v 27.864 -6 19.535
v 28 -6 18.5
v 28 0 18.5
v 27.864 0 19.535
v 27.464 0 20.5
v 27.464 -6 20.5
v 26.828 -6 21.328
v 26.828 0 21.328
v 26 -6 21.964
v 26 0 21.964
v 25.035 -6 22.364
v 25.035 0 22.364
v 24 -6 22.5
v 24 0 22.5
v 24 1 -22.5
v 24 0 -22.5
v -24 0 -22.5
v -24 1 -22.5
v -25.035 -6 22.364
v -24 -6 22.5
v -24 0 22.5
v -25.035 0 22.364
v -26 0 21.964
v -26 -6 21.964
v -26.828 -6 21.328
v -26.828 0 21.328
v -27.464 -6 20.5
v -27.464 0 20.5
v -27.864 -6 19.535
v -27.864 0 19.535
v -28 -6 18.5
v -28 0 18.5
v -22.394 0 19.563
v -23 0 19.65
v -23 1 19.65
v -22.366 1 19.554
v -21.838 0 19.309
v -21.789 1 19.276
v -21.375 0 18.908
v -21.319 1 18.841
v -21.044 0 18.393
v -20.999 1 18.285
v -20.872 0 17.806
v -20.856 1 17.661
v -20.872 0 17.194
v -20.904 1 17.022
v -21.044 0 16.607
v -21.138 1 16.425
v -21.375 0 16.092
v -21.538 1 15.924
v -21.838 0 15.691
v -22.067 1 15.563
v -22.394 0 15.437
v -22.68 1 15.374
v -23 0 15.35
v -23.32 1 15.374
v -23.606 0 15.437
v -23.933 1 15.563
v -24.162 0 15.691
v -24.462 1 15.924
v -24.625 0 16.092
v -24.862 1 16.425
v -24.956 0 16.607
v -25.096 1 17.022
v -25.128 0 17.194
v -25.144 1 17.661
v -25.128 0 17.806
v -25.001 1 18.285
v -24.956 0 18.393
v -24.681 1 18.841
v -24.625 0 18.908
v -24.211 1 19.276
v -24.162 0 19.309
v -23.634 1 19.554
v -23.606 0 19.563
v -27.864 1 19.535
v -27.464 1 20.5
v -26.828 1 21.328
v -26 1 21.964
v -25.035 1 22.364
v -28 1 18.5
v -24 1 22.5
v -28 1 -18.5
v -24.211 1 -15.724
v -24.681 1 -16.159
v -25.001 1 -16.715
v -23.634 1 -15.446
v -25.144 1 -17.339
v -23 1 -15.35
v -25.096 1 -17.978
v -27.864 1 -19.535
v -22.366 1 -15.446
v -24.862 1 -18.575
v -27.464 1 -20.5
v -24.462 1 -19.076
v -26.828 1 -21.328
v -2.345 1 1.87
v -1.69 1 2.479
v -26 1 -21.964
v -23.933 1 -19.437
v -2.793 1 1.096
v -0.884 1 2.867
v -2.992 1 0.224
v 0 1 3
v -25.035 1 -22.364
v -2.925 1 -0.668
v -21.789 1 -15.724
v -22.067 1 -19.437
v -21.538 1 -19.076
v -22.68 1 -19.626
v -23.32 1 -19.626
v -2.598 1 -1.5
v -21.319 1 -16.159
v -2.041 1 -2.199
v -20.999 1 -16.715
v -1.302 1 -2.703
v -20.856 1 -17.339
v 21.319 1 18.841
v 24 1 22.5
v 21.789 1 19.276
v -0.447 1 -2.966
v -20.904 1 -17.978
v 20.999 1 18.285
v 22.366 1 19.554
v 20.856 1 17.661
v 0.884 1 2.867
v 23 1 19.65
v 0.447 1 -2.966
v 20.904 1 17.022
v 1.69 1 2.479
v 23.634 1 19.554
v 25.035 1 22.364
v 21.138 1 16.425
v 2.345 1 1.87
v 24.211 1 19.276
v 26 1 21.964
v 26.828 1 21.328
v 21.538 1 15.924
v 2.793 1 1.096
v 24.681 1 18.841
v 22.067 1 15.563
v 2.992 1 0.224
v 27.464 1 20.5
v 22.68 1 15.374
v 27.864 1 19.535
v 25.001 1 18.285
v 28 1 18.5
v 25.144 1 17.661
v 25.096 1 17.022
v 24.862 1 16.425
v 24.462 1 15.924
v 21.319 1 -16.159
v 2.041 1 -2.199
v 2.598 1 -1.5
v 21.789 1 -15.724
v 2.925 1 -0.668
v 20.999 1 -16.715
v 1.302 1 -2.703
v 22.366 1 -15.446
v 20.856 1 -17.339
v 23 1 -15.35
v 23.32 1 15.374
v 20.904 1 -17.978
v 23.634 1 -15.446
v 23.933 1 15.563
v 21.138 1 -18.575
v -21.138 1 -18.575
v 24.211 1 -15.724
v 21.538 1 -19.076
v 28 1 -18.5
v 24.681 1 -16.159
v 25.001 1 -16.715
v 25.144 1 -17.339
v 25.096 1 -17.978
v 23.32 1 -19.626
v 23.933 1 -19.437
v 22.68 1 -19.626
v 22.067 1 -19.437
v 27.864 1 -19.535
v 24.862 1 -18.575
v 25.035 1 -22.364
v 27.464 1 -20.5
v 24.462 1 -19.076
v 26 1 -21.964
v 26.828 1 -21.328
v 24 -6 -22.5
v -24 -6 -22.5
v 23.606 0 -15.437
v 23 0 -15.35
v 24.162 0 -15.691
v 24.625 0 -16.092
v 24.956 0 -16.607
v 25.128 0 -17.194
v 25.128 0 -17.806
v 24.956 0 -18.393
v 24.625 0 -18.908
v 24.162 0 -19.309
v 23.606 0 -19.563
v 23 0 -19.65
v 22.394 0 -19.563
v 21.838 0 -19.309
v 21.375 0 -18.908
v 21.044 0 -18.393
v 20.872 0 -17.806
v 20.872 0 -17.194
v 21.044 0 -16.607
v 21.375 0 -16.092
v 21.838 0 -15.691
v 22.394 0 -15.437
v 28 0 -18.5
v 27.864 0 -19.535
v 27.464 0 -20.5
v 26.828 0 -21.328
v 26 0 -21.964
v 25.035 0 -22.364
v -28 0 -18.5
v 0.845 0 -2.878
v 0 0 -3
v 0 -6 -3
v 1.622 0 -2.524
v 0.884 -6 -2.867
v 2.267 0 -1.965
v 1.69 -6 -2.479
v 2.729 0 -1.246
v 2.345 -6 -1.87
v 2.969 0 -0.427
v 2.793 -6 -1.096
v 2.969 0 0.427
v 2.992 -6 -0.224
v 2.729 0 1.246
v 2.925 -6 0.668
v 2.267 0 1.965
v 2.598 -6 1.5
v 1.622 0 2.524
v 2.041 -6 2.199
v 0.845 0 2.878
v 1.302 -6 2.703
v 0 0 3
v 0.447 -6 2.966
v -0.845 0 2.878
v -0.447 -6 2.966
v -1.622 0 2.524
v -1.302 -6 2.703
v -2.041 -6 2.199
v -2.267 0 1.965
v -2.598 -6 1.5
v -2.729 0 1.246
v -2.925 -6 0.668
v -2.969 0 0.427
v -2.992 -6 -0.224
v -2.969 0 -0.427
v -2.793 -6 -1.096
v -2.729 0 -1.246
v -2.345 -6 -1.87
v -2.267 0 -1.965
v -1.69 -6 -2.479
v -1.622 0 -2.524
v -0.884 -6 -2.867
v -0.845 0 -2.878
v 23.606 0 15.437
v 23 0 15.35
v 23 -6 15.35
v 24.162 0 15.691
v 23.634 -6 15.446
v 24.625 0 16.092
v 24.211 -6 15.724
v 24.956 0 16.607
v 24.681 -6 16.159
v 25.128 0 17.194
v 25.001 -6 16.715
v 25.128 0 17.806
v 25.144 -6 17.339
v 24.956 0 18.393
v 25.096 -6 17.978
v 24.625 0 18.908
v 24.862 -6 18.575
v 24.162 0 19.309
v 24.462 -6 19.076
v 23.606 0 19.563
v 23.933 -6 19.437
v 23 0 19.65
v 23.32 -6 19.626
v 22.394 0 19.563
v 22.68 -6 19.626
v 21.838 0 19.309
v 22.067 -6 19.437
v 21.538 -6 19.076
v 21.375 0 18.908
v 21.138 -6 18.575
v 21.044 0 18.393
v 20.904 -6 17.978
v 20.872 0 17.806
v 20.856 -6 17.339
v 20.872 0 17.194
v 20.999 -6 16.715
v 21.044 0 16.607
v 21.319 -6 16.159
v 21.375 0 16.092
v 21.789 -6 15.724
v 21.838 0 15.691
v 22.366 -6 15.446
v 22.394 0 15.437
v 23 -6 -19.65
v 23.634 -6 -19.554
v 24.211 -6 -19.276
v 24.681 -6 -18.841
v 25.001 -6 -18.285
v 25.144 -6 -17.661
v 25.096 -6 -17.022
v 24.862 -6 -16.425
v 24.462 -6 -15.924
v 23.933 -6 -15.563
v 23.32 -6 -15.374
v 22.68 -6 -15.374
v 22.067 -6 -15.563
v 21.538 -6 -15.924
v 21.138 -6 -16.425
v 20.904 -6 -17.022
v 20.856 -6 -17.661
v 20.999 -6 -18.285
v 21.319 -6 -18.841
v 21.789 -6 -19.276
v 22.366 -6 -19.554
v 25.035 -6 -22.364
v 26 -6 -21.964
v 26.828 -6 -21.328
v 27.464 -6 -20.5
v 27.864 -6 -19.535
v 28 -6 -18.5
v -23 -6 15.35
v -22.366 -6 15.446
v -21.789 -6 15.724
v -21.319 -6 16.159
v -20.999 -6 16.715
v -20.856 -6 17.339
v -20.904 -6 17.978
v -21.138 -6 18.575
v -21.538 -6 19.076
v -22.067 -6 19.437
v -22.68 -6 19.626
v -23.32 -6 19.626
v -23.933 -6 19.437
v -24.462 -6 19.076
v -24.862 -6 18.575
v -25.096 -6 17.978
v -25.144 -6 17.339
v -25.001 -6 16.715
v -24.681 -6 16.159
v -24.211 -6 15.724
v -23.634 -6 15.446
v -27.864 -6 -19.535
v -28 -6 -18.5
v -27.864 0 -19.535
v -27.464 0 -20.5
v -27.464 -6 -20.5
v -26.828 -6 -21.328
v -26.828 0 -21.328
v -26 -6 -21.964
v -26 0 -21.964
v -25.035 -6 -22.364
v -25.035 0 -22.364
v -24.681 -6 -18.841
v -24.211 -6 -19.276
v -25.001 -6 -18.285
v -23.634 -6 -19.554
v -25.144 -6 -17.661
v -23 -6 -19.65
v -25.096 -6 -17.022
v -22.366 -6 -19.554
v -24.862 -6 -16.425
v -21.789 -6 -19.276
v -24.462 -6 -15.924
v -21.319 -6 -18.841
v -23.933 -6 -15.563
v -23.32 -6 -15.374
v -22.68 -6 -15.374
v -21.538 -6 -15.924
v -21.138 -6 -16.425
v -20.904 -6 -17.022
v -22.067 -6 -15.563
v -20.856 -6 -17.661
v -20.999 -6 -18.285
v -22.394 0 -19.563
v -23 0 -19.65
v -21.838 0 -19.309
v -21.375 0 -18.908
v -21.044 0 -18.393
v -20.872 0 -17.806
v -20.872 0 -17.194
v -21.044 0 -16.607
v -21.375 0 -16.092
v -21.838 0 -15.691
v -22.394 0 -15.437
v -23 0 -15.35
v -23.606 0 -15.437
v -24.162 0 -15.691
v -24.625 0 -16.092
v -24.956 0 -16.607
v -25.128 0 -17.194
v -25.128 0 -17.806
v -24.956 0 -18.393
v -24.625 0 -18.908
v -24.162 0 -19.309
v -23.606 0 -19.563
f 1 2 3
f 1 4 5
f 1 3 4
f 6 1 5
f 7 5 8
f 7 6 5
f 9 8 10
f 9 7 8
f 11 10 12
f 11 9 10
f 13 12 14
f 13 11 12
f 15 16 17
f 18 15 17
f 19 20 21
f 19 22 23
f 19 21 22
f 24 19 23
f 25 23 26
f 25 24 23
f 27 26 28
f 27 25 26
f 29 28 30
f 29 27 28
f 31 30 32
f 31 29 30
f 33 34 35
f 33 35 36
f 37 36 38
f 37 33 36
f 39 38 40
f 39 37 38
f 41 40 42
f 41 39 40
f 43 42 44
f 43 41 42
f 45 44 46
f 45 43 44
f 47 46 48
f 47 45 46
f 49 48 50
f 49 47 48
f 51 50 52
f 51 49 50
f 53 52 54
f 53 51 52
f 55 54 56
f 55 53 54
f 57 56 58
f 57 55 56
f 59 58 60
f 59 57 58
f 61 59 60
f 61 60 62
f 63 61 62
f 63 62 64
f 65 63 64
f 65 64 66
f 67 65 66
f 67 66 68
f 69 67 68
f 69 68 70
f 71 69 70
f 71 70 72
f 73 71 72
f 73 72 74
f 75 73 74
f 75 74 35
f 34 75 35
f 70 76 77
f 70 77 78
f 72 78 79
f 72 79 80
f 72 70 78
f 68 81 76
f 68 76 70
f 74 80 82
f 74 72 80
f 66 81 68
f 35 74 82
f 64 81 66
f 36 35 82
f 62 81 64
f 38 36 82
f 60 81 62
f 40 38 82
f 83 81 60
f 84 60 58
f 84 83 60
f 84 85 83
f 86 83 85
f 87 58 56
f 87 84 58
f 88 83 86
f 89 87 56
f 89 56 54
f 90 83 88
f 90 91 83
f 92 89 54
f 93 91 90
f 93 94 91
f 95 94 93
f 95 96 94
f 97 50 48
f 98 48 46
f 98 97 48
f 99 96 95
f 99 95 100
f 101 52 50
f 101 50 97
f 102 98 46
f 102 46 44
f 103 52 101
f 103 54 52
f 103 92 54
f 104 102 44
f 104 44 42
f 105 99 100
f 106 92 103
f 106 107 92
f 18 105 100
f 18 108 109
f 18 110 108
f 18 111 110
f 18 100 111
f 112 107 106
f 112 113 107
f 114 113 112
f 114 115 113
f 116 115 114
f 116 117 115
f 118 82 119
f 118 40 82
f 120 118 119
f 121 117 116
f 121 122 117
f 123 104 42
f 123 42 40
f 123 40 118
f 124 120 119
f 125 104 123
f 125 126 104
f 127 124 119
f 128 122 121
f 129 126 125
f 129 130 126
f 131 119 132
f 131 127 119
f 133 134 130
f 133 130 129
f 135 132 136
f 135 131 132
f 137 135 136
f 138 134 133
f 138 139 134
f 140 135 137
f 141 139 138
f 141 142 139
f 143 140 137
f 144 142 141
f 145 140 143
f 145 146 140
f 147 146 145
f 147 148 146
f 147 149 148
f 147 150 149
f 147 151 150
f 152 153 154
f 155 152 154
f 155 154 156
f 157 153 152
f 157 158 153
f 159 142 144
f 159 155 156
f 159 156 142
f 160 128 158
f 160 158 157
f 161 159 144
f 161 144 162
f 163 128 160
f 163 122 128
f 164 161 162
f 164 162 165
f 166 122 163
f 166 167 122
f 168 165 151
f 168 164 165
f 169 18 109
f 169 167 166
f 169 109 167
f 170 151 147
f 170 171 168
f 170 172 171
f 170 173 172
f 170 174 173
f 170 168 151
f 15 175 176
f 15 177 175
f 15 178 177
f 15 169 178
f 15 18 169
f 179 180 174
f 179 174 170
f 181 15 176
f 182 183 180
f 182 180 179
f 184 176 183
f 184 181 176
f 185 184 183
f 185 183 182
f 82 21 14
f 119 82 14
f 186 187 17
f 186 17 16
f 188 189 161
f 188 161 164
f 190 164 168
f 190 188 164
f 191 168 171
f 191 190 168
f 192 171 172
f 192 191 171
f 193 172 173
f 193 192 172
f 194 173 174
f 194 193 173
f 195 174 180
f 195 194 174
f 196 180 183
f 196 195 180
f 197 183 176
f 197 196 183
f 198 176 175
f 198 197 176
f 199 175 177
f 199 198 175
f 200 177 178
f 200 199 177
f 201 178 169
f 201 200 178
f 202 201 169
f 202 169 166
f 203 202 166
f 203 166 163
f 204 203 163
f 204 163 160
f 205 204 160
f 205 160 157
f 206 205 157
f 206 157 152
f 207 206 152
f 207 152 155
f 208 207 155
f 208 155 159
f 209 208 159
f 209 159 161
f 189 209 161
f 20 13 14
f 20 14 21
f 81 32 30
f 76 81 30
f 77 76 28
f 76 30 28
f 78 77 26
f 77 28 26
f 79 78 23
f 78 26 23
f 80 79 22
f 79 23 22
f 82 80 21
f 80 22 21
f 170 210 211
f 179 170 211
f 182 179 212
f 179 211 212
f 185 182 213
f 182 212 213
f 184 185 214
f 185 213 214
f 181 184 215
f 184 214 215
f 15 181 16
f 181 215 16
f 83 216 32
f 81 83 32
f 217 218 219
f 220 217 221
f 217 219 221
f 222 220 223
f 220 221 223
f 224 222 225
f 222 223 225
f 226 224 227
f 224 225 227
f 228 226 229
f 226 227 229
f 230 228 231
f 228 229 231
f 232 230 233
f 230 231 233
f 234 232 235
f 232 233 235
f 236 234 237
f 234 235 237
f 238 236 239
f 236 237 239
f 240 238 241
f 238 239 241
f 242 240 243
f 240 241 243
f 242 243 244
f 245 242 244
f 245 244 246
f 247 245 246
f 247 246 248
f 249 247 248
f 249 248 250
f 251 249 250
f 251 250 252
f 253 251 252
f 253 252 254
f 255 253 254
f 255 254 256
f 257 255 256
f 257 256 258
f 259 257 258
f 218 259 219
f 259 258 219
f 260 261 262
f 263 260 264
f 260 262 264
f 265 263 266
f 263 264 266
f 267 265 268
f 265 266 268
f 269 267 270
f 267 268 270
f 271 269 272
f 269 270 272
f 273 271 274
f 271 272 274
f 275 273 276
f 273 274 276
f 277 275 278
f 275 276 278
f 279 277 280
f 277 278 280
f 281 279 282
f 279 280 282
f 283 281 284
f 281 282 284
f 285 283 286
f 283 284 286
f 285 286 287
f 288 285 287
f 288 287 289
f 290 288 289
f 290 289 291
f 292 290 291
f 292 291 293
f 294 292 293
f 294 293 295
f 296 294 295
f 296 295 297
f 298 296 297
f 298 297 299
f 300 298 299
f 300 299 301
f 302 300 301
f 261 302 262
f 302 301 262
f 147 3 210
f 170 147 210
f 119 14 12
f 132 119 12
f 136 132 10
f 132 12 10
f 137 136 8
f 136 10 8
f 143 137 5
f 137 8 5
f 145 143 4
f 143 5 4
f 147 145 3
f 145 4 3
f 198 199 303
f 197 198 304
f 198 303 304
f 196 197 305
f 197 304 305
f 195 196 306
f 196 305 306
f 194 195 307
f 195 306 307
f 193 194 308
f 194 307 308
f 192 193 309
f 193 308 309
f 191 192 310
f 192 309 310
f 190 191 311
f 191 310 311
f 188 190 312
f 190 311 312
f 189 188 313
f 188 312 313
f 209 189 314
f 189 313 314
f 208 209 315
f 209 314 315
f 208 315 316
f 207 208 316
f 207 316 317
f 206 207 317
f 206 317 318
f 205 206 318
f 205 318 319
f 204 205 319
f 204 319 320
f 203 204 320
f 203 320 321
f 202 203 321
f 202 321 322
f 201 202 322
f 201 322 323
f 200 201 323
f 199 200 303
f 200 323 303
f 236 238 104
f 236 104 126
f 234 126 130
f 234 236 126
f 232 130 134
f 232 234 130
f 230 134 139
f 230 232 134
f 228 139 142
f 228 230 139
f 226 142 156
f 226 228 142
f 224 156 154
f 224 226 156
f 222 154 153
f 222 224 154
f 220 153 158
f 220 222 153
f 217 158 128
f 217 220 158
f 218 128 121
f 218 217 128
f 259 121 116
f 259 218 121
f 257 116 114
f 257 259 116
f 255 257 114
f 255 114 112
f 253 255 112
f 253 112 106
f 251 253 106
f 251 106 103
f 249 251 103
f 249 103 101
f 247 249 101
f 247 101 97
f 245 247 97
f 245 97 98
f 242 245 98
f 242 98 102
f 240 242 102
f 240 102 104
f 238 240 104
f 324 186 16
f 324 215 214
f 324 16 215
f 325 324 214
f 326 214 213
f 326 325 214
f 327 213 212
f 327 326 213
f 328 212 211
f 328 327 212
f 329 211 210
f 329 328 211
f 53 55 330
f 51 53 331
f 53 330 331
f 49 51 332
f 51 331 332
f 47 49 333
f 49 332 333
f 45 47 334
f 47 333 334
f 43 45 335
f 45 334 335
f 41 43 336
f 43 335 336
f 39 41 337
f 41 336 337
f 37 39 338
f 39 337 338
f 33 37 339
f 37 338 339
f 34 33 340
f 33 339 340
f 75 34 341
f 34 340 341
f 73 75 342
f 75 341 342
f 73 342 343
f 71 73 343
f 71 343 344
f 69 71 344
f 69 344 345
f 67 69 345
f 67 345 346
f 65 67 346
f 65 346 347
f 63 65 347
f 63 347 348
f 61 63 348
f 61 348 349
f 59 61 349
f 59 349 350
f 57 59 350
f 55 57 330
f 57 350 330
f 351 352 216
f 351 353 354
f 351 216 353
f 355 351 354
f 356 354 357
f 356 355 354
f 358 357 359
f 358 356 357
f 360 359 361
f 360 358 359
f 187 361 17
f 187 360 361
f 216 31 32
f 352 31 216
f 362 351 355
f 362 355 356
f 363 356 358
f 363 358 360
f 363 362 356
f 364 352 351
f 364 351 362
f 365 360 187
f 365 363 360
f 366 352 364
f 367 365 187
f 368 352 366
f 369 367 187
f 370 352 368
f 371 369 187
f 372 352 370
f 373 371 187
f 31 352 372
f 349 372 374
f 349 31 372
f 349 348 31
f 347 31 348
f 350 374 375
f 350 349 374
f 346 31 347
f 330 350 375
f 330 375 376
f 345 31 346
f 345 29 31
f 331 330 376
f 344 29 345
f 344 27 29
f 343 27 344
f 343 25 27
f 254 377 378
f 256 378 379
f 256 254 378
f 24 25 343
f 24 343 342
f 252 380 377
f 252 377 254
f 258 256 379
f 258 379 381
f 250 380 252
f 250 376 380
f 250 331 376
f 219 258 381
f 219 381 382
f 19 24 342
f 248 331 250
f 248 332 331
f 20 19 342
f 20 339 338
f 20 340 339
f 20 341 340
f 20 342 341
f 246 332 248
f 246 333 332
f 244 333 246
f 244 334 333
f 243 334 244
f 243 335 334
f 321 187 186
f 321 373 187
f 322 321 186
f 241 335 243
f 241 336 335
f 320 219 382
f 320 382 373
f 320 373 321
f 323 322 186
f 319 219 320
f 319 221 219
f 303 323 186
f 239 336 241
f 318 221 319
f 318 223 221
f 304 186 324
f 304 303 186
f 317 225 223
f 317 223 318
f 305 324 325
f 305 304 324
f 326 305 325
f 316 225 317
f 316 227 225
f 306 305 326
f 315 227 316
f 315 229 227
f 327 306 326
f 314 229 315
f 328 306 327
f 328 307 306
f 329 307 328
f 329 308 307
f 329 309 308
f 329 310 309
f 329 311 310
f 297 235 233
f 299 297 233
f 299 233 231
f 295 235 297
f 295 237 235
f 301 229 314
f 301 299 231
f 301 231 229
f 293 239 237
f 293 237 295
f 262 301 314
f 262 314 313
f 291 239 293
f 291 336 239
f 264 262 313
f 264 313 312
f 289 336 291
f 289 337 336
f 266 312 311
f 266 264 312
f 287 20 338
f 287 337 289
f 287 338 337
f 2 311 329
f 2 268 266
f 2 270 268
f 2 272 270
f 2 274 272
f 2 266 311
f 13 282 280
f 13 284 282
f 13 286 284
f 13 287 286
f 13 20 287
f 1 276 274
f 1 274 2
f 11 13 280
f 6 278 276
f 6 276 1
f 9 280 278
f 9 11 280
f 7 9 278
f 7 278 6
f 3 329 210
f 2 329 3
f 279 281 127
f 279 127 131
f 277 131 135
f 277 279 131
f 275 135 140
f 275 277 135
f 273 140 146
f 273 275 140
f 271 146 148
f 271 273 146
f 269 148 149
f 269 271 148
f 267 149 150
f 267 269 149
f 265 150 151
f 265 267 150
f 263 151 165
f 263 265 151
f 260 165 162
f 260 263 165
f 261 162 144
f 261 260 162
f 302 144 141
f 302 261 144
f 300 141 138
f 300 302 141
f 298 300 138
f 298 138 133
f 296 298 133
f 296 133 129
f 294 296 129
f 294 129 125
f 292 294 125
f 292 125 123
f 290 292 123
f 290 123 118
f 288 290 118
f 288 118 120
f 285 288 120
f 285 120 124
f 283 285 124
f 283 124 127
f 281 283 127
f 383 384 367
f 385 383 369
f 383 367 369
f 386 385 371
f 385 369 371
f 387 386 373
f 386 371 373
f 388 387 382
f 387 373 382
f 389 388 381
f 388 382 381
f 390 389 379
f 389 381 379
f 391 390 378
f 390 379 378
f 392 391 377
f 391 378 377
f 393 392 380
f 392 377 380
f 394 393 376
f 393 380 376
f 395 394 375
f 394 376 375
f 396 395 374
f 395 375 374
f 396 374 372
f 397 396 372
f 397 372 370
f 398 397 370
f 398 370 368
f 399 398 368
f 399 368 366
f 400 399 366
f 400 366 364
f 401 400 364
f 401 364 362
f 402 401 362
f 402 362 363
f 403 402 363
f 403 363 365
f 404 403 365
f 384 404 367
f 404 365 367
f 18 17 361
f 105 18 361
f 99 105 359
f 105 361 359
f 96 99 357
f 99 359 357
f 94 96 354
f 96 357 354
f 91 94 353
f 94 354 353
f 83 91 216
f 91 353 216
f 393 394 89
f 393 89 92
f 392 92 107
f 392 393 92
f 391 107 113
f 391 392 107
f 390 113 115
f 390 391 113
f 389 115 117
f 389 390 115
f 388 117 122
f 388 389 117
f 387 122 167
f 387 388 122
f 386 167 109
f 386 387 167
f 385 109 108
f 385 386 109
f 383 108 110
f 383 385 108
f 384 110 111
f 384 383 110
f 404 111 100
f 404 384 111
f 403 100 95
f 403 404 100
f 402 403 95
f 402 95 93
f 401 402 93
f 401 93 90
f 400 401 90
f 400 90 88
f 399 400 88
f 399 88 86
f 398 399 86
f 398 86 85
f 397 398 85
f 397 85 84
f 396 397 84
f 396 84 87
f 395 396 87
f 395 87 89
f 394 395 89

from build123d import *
from build123d.topology import SkipClean

# Parameters (mm, degrees)
SKETCH_1_R      = 2.15
SKETCH_1_R_2    = 3
EXTRUDE_1_DEPTH = 1
EXTRUDE_START   = 6
SKETCH_13_R     = 2.15
SKETCH_13_R_2   = 3
EXTRUDE_5_DEPTH = 6


with BuildPart() as part:
    # 草图1 → 凸台-拉伸1 (new body)
    with BuildSketch(Plane(origin=(0, 0, 0), x_dir=(1, 0, 0), z_dir=(0, 1, 0))):
        with BuildLine():
            Line((-24, -22.5), (24, -22.5))
            ThreePointArc((24, -22.5), (26.828427125, -21.328427125), (28, -18.5))
            Line((28, -18.5), (28, 18.5))
            ThreePointArc((28, 18.5), (26.828427125, 21.328427125), (24, 22.5))
            Line((24, 22.5), (-24, 22.5))
            ThreePointArc((-24, 22.5), (-26.828427125, 21.328427125), (-28, 18.5))
            Line((-28, 18.5), (-28, -18.5))
            ThreePointArc((-28, -18.5), (-26.828427125, -21.328427125), (-24, -22.5))
        make_face()
        with Locations(Location((-23, 17.5, 0), (0, 0, 270))):
            Circle(SKETCH_1_R, mode=Mode.SUBTRACT)
        with Locations(Location((-23, -17.5, 0), (0, 0, 270))):
            Circle(SKETCH_1_R, mode=Mode.SUBTRACT)
        with Locations(Location((23, -17.5, 0), (0, 0, 270))):
            Circle(SKETCH_1_R, mode=Mode.SUBTRACT)
        with Locations(Location((23, 17.5, 0), (0, 0, 270))):
            Circle(SKETCH_1_R, mode=Mode.SUBTRACT)
        with Locations(Location((0, 0, 0), (0, 0, 270))):
            Circle(SKETCH_1_R_2, mode=Mode.SUBTRACT)
    extrude(amount=EXTRUDE_1_DEPTH)

    # 草图13 → 凸台-拉伸5 (add)
    with SkipClean():  # the faces are left unmerged after this step: merging them gives an invalid solid
        with BuildSketch(Plane.XZ.offset(EXTRUDE_START)):
            with BuildLine():
                Line((-24, -22.5), (24, -22.5))
                ThreePointArc((24, -22.5), (26.828427125, -21.328427125), (28, -18.5))
                Line((28, -18.5), (28, 18.5))
                ThreePointArc((28, 18.5), (26.828427125, 21.328427125), (24, 22.5))
                Line((24, 22.5), (-24, 22.5))
                ThreePointArc((-24, 22.5), (-26.828427125, 21.328427125), (-28, 18.5))
                Line((-28, 18.5), (-28, -18.5))
                ThreePointArc((-28, -18.5), (-26.828427125, -21.328427125), (-24, -22.5))
            make_face()
            with Locations(Location((-23, 17.5, 0), (0, 0, 270))):
                Circle(SKETCH_13_R, mode=Mode.SUBTRACT)
            with Locations(Location((-23, -17.5, 0), (0, 0, 270))):
                Circle(SKETCH_13_R, mode=Mode.SUBTRACT)
            with Locations(Location((23, -17.5, 0), (0, 0, 270))):
                Circle(SKETCH_13_R, mode=Mode.SUBTRACT)
            with Locations(Location((23, 17.5, 0), (0, 0, 270))):
                Circle(SKETCH_13_R, mode=Mode.SUBTRACT)
            with Locations(Location((0, 0, 0), (0, 0, 270))):
                Circle(SKETCH_13_R_2, mode=Mode.SUBTRACT)
        extrude(amount=-EXTRUDE_5_DEPTH)


solid = part.part
